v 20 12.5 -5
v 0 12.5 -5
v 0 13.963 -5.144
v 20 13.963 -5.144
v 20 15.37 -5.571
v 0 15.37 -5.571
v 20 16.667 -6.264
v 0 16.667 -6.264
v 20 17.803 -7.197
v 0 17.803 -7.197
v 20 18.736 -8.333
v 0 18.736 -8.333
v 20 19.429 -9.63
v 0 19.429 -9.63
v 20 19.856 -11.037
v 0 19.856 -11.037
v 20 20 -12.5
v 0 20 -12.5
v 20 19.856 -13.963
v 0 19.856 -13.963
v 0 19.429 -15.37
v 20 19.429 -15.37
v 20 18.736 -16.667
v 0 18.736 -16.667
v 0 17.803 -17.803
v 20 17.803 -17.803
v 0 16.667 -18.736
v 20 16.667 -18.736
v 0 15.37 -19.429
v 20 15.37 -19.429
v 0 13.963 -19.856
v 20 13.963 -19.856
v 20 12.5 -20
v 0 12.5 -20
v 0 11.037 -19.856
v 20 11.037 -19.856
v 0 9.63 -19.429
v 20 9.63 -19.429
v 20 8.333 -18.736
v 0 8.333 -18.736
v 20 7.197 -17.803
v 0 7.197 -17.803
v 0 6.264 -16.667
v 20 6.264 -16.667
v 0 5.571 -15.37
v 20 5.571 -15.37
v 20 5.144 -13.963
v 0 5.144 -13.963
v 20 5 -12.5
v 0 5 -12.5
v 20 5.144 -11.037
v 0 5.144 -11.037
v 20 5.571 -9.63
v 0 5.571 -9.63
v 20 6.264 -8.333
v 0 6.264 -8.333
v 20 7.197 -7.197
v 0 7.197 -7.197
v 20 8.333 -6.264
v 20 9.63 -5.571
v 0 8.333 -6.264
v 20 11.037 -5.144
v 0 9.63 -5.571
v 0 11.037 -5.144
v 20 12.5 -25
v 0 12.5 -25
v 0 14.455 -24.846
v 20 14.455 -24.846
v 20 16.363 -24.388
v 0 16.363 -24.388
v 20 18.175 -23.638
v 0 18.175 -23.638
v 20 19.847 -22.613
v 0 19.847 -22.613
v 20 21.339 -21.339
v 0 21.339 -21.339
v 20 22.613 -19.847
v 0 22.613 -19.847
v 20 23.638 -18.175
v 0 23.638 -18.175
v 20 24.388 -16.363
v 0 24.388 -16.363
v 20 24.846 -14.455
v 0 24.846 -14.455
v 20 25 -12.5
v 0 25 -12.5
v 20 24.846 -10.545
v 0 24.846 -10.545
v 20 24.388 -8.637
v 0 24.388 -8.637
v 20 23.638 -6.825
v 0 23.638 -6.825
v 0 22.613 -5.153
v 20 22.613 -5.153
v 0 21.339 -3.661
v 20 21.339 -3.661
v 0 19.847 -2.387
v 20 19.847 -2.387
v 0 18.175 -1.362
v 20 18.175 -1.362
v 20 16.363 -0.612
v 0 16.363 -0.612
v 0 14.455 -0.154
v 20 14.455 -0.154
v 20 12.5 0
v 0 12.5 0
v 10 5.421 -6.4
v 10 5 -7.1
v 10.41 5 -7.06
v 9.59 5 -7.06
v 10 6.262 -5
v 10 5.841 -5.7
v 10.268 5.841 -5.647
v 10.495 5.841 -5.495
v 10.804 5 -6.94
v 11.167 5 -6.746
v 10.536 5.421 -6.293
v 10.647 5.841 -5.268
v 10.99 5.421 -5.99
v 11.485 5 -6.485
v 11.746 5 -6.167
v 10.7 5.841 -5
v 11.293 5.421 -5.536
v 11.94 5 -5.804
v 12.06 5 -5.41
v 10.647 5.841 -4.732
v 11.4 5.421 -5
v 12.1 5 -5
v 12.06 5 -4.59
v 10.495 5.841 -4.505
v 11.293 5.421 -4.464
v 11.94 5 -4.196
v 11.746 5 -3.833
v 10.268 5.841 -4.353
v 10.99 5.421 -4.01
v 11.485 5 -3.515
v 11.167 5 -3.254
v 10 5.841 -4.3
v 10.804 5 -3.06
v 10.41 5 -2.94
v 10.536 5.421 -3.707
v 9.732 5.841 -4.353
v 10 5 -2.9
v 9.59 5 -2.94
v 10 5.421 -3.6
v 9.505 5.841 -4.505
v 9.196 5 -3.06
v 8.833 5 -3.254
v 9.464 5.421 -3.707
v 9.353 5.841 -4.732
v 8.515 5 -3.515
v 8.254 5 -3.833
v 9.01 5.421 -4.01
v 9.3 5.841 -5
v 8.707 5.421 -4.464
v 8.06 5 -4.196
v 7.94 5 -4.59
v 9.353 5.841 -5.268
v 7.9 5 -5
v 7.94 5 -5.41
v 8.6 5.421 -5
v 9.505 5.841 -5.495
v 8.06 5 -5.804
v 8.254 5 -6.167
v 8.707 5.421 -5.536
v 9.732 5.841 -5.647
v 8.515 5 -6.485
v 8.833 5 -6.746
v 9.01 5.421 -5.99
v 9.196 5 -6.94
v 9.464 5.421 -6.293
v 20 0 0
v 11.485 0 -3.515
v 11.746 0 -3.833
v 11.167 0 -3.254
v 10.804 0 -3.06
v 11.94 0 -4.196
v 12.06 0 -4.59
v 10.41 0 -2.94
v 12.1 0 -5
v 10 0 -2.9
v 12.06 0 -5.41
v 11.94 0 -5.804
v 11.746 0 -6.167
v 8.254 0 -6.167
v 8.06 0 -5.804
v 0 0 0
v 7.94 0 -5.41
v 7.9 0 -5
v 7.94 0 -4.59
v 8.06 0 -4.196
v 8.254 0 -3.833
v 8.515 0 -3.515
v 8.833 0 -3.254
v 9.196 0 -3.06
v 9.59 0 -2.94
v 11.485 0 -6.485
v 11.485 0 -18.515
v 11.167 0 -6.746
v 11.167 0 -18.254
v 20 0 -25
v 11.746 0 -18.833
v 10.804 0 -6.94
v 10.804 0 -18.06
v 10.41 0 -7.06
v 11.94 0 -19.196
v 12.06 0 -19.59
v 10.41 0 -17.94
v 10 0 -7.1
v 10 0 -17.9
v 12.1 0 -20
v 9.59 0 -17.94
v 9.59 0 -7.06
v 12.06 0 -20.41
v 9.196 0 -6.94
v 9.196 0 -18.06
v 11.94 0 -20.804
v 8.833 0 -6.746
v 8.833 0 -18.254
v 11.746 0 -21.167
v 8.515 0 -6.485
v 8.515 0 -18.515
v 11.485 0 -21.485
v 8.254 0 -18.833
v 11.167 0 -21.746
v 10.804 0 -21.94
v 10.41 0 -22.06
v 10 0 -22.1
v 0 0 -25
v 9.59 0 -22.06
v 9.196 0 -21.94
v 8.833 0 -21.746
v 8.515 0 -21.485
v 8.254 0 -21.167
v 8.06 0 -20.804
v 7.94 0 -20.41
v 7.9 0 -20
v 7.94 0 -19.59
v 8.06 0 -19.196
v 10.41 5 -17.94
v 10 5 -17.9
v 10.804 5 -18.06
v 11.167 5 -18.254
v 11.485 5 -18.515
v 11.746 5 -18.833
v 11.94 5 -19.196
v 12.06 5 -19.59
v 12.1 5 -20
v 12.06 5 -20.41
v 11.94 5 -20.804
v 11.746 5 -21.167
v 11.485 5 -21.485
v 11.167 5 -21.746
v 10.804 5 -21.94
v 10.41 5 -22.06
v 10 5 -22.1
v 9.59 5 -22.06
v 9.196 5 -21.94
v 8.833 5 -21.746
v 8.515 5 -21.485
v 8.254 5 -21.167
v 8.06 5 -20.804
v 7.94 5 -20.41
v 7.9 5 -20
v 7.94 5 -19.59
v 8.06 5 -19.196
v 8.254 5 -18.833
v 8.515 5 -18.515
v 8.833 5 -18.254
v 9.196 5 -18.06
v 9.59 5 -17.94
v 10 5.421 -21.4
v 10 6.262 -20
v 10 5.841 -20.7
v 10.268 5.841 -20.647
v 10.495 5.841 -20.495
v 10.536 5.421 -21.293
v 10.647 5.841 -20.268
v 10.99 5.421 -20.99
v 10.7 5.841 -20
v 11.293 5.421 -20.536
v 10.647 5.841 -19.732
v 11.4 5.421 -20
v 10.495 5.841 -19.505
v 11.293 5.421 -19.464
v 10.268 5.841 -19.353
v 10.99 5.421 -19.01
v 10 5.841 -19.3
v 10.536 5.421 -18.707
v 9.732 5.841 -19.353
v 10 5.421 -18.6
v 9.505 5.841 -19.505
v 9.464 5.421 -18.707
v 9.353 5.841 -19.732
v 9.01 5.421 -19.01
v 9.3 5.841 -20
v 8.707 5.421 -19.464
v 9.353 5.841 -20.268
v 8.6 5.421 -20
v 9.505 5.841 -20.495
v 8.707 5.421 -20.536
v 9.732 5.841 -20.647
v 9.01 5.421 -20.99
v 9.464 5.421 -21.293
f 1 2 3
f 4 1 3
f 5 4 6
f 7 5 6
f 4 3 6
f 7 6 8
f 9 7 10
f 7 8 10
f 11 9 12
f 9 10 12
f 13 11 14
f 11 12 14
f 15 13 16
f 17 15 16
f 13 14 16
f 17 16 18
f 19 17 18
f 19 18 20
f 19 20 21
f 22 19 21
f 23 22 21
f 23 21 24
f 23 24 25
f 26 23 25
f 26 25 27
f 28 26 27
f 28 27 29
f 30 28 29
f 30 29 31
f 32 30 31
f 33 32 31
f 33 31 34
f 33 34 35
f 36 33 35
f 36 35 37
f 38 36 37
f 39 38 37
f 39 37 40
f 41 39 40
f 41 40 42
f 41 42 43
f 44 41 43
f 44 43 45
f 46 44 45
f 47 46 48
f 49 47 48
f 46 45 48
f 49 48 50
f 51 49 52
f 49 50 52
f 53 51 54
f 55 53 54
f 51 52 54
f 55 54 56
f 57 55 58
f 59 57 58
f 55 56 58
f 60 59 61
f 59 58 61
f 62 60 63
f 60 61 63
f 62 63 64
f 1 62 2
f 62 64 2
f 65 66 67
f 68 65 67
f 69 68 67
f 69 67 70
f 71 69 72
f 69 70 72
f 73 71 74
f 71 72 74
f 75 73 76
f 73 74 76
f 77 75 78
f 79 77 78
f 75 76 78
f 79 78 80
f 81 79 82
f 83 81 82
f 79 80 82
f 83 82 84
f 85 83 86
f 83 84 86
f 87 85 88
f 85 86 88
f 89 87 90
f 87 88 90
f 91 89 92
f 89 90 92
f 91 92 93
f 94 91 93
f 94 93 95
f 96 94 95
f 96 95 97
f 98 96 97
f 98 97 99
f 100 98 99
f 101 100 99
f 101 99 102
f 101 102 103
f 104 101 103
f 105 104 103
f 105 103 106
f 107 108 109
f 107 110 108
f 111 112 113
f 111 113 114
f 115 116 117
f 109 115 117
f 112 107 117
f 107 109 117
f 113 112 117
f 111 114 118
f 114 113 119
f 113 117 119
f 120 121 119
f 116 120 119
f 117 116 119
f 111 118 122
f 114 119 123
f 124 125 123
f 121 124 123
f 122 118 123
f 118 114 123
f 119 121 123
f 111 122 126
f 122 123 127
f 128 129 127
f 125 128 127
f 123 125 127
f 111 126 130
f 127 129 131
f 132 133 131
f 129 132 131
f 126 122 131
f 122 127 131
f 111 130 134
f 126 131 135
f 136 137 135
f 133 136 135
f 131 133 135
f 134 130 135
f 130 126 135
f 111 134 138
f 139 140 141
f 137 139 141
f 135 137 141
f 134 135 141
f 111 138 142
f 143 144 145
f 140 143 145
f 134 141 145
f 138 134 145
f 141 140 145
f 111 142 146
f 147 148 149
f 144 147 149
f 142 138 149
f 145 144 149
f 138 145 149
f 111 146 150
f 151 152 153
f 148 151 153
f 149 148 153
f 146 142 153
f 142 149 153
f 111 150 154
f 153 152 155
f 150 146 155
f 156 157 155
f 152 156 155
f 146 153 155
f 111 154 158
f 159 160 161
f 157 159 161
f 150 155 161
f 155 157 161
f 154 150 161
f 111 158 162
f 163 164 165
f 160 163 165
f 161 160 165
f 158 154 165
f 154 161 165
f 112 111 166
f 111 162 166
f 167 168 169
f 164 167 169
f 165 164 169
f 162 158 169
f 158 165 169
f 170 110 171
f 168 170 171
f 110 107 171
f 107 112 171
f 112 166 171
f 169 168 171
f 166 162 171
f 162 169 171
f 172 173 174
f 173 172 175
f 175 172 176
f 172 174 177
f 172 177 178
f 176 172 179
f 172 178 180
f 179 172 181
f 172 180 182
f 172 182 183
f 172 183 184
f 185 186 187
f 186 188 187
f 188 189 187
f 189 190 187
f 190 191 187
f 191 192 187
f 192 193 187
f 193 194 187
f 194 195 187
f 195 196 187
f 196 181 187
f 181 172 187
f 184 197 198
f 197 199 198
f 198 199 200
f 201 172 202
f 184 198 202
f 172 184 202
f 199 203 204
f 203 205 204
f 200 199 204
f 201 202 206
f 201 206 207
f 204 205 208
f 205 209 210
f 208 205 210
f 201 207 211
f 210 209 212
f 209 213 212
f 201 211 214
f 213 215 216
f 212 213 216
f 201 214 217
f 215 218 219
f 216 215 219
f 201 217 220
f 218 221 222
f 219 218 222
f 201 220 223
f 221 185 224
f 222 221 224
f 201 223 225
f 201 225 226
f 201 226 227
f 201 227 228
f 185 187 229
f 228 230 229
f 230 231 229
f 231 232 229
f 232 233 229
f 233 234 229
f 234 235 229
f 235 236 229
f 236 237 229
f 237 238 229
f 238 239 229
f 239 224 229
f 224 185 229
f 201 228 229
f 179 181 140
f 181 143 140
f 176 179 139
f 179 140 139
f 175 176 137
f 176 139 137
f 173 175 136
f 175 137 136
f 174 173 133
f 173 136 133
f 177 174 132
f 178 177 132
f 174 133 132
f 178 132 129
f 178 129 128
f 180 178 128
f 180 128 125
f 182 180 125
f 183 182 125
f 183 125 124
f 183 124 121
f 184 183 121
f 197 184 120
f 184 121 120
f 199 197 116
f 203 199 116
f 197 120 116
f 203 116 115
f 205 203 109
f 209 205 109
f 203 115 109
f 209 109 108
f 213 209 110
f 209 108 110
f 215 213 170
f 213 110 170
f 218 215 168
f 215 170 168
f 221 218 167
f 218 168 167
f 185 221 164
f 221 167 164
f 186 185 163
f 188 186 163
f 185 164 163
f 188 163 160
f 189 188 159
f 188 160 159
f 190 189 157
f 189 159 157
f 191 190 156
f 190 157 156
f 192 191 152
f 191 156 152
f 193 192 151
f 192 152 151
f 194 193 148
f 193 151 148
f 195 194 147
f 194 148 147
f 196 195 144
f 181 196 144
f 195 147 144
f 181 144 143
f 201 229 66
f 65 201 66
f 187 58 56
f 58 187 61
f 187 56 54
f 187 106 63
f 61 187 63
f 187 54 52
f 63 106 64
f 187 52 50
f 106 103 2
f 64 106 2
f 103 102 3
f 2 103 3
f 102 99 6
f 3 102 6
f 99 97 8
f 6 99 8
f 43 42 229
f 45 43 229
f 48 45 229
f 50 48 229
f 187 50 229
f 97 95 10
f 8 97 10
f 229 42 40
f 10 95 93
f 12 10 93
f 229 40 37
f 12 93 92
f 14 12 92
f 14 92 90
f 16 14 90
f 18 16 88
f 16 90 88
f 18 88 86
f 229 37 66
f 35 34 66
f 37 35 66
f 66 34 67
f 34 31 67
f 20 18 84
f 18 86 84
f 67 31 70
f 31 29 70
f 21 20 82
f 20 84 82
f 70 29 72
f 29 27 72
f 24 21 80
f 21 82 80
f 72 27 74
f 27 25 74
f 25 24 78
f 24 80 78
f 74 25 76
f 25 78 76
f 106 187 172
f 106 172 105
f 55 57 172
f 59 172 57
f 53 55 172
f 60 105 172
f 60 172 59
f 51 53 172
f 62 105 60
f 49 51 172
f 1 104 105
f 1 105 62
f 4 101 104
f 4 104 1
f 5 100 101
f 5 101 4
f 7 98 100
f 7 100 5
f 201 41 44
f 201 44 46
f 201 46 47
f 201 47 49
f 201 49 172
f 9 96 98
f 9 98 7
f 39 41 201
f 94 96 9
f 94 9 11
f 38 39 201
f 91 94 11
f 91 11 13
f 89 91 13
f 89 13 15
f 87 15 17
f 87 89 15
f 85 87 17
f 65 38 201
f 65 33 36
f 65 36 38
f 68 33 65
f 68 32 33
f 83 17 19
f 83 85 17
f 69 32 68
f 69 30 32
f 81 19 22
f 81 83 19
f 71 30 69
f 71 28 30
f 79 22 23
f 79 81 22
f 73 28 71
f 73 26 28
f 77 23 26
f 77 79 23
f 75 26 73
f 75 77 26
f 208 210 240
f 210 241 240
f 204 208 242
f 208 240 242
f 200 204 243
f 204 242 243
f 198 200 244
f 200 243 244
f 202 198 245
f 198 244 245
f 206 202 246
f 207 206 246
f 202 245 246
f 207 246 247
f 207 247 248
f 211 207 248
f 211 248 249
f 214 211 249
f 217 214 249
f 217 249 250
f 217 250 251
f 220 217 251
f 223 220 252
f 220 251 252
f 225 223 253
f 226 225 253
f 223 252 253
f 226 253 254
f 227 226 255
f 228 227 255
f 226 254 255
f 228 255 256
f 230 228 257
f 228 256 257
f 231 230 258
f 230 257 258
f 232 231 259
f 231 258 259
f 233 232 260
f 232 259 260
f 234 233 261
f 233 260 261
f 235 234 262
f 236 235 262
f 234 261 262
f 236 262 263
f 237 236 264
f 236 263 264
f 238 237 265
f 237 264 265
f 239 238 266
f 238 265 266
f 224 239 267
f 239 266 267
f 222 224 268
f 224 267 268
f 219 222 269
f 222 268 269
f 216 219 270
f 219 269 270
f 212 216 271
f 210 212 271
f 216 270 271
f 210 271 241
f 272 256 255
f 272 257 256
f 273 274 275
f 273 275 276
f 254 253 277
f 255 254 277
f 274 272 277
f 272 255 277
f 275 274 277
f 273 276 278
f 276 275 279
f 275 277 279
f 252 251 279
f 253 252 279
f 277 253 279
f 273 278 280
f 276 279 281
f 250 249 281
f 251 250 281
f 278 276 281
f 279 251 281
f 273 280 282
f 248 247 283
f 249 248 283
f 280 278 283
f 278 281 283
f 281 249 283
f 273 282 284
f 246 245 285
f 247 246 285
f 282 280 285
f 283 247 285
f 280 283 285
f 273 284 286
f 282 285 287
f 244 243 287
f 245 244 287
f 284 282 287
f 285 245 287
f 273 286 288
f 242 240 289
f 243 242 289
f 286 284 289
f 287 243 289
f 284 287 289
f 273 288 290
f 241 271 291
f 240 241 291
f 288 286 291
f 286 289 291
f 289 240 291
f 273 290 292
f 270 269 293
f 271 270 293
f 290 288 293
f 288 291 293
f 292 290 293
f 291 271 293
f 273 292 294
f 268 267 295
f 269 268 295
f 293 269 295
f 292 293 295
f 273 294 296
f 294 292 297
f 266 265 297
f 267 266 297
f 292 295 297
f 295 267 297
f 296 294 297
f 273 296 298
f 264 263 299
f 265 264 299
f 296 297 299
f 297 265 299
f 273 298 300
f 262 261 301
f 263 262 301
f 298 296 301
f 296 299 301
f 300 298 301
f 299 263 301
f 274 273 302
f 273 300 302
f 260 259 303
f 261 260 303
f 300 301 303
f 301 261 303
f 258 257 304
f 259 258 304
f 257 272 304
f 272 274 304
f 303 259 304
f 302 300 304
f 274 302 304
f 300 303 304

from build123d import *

# Parameters (mm, degrees)
ESQUISSE3_R             = 12.5
ESQUISSE3_W             = 25
ESQUISSE3_H             = 12.5
BOSS_EXTRU_2_DEPTH      = 20
ESQUISSE4_R             = 7.5
ENL_V_MAT_EXTRU_1_DEPTH = 41.620192023
TROU_TARAUD_M51_D       = 4.2
TROU_TARAUD_M51_DEPTH   = 5
TROU_TARAUD_M51_TIP     = 1.2618073


with BuildPart() as part:
    # Esquisse3 → Boss.-Extru.2 (new body)
    with BuildSketch(Plane(origin=(0, 0, 0), x_dir=(0, 0, -1), z_dir=(1, 0, 0))):
        with Locations((12.5, 12.5)):
            Circle(ESQUISSE3_R)
        with Locations((12.5, 6.25)):
            Rectangle(ESQUISSE3_W, ESQUISSE3_H)
    extrude(amount=BOSS_EXTRU_2_DEPTH)

    # Esquisse4 → Enlèv. mat.-Extru.1 (cut, through all)
    with BuildSketch(Plane.ZY):
        with Locations((-12.5, 12.5)):
            Circle(ESQUISSE4_R)
    extrude(amount=-ENL_V_MAT_EXTRU_1_DEPTH, mode=Mode.SUBTRACT)

    # Trou taraudé M51
    with Locations(Plane(origin=(10, 0, -5), x_dir=(0, 0, -1), z_dir=(0, -1, 0))):
        with Locations((0, 0), (15, 0)):
            Hole(TROU_TARAUD_M51_D / 2, depth=TROU_TARAUD_M51_DEPTH)
            with Locations((0, 0, -(TROU_TARAUD_M51_DEPTH + TROU_TARAUD_M51_TIP / 2))):  # 118° drill point
                Cone(0, TROU_TARAUD_M51_D / 2, TROU_TARAUD_M51_TIP, mode=Mode.SUBTRACT)


solid = part.part
